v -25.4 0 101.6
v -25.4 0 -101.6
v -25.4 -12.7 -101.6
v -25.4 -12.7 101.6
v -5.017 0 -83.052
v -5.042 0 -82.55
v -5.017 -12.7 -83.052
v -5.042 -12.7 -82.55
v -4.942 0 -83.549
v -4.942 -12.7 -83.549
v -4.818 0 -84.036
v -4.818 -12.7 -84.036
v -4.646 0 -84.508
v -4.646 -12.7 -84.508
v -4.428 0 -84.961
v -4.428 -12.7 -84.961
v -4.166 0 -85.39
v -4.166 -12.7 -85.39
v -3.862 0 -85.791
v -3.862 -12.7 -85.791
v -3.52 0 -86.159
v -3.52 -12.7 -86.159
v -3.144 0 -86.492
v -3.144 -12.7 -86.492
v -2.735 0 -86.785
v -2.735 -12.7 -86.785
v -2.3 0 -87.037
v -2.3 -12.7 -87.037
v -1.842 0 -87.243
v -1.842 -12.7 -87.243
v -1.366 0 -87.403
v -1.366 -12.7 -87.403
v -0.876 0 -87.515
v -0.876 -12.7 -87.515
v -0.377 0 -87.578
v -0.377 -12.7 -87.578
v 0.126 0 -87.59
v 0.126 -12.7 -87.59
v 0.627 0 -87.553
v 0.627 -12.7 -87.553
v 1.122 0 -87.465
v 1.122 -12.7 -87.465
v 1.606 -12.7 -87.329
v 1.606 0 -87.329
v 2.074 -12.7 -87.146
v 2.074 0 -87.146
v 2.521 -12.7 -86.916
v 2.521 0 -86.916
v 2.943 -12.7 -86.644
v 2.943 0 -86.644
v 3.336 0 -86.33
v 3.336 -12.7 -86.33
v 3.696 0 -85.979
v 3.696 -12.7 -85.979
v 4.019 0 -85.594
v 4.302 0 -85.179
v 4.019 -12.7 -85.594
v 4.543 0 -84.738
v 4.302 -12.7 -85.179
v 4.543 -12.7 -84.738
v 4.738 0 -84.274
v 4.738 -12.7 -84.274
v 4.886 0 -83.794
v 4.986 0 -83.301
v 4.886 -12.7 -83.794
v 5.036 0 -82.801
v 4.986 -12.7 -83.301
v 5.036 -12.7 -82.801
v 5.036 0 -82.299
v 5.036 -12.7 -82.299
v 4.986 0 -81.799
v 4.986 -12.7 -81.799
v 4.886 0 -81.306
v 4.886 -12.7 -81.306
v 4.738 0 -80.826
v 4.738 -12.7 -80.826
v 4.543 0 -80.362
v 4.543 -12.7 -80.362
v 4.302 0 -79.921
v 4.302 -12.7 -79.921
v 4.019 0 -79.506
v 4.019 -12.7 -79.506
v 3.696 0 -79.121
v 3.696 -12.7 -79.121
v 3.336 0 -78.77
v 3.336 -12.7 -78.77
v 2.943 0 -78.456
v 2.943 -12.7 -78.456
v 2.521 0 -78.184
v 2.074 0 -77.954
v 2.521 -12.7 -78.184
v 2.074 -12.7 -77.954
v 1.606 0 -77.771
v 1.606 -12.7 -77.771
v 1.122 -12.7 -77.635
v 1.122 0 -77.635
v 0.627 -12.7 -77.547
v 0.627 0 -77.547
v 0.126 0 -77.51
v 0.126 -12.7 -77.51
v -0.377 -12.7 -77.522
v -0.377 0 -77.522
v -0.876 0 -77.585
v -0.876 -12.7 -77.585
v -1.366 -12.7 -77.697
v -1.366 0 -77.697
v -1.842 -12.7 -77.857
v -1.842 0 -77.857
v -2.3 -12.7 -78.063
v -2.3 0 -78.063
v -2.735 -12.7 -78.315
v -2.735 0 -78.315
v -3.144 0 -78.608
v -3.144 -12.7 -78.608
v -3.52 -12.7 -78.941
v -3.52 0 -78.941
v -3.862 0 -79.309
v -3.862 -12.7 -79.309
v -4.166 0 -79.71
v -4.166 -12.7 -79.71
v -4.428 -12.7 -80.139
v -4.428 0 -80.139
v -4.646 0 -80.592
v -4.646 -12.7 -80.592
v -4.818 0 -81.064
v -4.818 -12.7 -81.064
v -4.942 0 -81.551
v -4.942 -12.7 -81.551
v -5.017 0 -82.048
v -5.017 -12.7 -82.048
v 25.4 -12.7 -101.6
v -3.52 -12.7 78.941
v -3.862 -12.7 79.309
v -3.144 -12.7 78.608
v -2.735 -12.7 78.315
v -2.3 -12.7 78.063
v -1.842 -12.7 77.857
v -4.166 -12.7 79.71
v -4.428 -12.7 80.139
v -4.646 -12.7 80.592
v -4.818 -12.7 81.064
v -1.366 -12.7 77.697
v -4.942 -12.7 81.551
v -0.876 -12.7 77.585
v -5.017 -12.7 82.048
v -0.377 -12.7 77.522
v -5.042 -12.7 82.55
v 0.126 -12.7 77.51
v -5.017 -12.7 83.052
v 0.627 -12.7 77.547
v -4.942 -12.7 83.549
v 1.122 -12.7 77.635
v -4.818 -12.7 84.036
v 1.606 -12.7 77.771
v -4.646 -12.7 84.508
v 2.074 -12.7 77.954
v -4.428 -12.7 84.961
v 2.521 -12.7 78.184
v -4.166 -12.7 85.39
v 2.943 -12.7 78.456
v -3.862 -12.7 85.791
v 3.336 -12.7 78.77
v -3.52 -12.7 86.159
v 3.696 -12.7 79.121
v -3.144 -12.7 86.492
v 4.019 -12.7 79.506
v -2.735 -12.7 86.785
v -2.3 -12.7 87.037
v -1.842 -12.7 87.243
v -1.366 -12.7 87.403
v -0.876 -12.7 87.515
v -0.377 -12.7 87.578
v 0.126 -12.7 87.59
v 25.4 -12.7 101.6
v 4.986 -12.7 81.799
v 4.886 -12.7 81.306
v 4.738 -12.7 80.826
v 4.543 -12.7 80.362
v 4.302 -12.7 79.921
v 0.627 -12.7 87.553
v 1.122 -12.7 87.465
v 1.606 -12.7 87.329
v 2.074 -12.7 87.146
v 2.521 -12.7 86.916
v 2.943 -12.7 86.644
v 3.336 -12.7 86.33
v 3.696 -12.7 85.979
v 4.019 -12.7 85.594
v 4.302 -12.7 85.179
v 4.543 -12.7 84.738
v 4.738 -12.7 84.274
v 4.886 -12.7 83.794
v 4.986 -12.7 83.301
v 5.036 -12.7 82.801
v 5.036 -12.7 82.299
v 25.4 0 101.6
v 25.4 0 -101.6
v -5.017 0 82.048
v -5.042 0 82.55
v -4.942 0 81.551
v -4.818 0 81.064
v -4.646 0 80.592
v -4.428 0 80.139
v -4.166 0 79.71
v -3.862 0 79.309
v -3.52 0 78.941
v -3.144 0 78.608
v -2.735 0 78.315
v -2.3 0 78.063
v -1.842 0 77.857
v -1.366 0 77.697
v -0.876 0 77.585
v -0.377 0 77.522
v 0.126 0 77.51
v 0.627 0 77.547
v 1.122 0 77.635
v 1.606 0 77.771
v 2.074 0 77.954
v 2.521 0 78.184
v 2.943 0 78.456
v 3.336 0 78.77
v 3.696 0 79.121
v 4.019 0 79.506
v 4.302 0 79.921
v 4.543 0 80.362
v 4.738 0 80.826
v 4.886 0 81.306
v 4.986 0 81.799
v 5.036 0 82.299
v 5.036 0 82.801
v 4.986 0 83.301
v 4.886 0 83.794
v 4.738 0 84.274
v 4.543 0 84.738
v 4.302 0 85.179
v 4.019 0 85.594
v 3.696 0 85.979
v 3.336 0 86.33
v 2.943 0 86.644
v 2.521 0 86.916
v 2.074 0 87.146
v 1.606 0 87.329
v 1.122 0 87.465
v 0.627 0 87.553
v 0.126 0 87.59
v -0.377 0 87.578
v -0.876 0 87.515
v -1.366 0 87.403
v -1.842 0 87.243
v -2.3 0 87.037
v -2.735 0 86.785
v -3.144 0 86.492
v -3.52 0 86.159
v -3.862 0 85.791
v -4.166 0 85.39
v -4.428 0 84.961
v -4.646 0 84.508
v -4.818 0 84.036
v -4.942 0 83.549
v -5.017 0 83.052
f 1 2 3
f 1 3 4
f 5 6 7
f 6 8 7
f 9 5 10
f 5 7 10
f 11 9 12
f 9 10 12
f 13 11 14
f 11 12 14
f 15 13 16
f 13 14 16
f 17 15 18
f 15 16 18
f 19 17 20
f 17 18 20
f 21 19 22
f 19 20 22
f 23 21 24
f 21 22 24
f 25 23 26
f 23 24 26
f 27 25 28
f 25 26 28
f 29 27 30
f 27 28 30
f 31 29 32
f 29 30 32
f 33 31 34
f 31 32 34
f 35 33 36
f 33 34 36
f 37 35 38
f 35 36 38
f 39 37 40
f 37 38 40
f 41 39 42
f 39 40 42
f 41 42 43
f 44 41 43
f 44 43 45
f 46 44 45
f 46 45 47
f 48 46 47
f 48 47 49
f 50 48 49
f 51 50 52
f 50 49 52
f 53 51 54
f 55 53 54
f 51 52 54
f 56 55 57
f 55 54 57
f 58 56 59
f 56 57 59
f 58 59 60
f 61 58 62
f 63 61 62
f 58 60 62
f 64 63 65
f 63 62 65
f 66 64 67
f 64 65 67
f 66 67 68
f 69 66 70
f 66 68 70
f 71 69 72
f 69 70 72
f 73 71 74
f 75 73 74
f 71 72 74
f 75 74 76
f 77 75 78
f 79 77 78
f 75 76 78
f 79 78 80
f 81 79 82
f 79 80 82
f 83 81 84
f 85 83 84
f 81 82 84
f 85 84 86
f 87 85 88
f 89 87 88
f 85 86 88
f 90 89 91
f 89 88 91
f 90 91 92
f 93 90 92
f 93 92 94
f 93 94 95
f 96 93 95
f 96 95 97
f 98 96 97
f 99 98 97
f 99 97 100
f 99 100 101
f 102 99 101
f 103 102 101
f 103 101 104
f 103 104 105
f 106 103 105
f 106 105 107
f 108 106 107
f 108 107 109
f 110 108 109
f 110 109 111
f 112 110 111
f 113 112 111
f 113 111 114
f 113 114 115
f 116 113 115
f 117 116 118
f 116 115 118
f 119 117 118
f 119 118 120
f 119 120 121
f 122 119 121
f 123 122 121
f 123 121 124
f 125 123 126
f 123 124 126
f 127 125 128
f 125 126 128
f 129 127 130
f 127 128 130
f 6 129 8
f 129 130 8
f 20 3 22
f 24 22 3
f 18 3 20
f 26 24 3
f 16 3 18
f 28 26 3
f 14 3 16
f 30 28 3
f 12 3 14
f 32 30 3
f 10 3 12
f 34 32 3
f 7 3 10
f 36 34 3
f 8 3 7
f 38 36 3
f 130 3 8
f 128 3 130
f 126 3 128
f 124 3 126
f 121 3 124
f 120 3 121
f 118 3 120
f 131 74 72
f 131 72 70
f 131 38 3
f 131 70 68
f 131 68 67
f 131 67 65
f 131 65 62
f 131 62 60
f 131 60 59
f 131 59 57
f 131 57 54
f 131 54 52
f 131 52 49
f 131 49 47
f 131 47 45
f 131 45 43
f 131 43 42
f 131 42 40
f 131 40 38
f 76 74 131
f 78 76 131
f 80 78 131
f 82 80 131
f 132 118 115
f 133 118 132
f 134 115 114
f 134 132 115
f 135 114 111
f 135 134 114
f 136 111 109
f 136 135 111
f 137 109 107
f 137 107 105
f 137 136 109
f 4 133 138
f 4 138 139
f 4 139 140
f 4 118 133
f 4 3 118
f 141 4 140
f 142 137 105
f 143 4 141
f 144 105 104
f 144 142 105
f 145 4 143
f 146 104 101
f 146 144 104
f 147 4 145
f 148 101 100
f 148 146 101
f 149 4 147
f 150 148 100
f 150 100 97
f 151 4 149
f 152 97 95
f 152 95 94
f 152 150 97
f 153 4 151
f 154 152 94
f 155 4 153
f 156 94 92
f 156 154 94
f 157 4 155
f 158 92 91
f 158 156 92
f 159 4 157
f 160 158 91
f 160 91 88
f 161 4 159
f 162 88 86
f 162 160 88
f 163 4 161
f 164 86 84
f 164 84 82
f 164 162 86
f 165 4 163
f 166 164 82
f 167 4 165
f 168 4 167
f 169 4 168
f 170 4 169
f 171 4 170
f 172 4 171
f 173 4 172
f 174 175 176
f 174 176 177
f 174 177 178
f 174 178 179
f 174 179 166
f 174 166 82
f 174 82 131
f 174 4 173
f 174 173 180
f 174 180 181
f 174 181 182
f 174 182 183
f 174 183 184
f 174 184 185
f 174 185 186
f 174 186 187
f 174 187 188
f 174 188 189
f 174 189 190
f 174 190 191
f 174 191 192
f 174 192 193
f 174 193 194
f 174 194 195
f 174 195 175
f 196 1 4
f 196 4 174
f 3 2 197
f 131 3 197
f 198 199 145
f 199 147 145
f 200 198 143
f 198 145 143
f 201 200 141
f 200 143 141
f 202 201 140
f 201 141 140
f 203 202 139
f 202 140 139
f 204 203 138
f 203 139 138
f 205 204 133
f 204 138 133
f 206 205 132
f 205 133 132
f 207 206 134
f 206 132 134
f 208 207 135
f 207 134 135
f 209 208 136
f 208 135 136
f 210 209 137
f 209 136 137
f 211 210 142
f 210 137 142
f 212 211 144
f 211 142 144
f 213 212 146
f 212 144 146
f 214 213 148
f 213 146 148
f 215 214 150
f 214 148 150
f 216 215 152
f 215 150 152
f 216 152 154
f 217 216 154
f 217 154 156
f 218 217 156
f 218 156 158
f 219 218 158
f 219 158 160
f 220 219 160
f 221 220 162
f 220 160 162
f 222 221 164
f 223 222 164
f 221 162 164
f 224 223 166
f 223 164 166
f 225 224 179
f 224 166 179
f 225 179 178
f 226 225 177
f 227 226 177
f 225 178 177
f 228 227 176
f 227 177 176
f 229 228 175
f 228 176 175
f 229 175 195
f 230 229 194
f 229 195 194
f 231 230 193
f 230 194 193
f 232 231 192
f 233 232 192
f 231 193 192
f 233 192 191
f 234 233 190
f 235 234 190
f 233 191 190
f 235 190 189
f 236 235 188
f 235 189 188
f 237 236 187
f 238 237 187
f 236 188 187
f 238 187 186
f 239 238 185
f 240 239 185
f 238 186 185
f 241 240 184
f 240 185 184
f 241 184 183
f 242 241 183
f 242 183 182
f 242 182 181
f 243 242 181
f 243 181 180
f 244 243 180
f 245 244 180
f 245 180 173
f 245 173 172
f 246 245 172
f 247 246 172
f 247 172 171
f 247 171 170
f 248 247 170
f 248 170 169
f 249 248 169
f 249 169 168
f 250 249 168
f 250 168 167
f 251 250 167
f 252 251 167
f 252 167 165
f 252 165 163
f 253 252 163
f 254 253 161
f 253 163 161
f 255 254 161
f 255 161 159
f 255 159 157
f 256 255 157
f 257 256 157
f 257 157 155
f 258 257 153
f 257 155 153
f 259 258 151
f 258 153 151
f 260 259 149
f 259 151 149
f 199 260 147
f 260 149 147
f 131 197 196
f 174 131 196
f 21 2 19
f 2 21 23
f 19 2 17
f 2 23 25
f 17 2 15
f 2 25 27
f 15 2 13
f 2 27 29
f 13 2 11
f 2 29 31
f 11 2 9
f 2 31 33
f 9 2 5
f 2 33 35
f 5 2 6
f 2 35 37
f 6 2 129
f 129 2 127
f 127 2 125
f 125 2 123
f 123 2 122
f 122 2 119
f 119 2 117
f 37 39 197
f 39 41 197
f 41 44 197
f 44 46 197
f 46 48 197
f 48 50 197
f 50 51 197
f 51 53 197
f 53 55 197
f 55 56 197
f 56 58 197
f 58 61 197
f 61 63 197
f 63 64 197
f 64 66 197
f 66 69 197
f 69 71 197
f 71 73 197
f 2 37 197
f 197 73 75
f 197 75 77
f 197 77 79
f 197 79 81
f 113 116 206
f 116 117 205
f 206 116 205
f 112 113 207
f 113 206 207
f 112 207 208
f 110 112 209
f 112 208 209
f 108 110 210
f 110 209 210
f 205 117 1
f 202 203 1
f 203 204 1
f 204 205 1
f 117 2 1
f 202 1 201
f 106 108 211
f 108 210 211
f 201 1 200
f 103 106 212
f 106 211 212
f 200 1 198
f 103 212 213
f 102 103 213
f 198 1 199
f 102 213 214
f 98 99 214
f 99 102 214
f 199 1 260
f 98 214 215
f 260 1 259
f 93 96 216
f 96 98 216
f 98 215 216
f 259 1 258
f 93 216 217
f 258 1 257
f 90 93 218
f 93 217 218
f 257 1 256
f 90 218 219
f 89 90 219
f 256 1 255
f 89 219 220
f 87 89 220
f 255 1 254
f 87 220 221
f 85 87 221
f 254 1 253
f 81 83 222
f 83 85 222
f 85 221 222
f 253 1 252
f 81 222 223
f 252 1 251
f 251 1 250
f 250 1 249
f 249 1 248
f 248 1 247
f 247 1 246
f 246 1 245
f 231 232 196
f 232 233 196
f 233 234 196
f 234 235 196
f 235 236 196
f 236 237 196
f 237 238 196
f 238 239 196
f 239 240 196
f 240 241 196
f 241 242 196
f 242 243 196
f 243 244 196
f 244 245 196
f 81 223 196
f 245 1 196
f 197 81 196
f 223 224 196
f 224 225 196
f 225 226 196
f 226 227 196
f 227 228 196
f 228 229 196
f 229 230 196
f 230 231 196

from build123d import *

# Parameters (mm, degrees)
F0_W     = 50.8
F0_H     = 203.2
F1_DEPTH = 12.7
F2_D     = 10.0838
F2_DEPTH = 12.7
F2_TIP   = 3.0294791551


with BuildPart() as f1:
    # F0 (on Front) → F1 (new body)
    with BuildSketch(Plane.XZ):
        Rectangle(F0_W, F0_H)
    extrude(amount=F1_DEPTH)

    # F2
    with Locations(Plane(origin=(0, 0, 0), x_dir=(1, 0, 0), z_dir=(0, 1, 0))):
        with Locations((0, -82.55), (0, 82.55)):
            Hole(F2_D / 2, depth=F2_DEPTH)
            with Locations((0, 0, -(F2_DEPTH + F2_TIP / 2))):  # 118° drill point
                Cone(0, F2_D / 2, F2_TIP, mode=Mode.SUBTRACT)


solid = f1.part
